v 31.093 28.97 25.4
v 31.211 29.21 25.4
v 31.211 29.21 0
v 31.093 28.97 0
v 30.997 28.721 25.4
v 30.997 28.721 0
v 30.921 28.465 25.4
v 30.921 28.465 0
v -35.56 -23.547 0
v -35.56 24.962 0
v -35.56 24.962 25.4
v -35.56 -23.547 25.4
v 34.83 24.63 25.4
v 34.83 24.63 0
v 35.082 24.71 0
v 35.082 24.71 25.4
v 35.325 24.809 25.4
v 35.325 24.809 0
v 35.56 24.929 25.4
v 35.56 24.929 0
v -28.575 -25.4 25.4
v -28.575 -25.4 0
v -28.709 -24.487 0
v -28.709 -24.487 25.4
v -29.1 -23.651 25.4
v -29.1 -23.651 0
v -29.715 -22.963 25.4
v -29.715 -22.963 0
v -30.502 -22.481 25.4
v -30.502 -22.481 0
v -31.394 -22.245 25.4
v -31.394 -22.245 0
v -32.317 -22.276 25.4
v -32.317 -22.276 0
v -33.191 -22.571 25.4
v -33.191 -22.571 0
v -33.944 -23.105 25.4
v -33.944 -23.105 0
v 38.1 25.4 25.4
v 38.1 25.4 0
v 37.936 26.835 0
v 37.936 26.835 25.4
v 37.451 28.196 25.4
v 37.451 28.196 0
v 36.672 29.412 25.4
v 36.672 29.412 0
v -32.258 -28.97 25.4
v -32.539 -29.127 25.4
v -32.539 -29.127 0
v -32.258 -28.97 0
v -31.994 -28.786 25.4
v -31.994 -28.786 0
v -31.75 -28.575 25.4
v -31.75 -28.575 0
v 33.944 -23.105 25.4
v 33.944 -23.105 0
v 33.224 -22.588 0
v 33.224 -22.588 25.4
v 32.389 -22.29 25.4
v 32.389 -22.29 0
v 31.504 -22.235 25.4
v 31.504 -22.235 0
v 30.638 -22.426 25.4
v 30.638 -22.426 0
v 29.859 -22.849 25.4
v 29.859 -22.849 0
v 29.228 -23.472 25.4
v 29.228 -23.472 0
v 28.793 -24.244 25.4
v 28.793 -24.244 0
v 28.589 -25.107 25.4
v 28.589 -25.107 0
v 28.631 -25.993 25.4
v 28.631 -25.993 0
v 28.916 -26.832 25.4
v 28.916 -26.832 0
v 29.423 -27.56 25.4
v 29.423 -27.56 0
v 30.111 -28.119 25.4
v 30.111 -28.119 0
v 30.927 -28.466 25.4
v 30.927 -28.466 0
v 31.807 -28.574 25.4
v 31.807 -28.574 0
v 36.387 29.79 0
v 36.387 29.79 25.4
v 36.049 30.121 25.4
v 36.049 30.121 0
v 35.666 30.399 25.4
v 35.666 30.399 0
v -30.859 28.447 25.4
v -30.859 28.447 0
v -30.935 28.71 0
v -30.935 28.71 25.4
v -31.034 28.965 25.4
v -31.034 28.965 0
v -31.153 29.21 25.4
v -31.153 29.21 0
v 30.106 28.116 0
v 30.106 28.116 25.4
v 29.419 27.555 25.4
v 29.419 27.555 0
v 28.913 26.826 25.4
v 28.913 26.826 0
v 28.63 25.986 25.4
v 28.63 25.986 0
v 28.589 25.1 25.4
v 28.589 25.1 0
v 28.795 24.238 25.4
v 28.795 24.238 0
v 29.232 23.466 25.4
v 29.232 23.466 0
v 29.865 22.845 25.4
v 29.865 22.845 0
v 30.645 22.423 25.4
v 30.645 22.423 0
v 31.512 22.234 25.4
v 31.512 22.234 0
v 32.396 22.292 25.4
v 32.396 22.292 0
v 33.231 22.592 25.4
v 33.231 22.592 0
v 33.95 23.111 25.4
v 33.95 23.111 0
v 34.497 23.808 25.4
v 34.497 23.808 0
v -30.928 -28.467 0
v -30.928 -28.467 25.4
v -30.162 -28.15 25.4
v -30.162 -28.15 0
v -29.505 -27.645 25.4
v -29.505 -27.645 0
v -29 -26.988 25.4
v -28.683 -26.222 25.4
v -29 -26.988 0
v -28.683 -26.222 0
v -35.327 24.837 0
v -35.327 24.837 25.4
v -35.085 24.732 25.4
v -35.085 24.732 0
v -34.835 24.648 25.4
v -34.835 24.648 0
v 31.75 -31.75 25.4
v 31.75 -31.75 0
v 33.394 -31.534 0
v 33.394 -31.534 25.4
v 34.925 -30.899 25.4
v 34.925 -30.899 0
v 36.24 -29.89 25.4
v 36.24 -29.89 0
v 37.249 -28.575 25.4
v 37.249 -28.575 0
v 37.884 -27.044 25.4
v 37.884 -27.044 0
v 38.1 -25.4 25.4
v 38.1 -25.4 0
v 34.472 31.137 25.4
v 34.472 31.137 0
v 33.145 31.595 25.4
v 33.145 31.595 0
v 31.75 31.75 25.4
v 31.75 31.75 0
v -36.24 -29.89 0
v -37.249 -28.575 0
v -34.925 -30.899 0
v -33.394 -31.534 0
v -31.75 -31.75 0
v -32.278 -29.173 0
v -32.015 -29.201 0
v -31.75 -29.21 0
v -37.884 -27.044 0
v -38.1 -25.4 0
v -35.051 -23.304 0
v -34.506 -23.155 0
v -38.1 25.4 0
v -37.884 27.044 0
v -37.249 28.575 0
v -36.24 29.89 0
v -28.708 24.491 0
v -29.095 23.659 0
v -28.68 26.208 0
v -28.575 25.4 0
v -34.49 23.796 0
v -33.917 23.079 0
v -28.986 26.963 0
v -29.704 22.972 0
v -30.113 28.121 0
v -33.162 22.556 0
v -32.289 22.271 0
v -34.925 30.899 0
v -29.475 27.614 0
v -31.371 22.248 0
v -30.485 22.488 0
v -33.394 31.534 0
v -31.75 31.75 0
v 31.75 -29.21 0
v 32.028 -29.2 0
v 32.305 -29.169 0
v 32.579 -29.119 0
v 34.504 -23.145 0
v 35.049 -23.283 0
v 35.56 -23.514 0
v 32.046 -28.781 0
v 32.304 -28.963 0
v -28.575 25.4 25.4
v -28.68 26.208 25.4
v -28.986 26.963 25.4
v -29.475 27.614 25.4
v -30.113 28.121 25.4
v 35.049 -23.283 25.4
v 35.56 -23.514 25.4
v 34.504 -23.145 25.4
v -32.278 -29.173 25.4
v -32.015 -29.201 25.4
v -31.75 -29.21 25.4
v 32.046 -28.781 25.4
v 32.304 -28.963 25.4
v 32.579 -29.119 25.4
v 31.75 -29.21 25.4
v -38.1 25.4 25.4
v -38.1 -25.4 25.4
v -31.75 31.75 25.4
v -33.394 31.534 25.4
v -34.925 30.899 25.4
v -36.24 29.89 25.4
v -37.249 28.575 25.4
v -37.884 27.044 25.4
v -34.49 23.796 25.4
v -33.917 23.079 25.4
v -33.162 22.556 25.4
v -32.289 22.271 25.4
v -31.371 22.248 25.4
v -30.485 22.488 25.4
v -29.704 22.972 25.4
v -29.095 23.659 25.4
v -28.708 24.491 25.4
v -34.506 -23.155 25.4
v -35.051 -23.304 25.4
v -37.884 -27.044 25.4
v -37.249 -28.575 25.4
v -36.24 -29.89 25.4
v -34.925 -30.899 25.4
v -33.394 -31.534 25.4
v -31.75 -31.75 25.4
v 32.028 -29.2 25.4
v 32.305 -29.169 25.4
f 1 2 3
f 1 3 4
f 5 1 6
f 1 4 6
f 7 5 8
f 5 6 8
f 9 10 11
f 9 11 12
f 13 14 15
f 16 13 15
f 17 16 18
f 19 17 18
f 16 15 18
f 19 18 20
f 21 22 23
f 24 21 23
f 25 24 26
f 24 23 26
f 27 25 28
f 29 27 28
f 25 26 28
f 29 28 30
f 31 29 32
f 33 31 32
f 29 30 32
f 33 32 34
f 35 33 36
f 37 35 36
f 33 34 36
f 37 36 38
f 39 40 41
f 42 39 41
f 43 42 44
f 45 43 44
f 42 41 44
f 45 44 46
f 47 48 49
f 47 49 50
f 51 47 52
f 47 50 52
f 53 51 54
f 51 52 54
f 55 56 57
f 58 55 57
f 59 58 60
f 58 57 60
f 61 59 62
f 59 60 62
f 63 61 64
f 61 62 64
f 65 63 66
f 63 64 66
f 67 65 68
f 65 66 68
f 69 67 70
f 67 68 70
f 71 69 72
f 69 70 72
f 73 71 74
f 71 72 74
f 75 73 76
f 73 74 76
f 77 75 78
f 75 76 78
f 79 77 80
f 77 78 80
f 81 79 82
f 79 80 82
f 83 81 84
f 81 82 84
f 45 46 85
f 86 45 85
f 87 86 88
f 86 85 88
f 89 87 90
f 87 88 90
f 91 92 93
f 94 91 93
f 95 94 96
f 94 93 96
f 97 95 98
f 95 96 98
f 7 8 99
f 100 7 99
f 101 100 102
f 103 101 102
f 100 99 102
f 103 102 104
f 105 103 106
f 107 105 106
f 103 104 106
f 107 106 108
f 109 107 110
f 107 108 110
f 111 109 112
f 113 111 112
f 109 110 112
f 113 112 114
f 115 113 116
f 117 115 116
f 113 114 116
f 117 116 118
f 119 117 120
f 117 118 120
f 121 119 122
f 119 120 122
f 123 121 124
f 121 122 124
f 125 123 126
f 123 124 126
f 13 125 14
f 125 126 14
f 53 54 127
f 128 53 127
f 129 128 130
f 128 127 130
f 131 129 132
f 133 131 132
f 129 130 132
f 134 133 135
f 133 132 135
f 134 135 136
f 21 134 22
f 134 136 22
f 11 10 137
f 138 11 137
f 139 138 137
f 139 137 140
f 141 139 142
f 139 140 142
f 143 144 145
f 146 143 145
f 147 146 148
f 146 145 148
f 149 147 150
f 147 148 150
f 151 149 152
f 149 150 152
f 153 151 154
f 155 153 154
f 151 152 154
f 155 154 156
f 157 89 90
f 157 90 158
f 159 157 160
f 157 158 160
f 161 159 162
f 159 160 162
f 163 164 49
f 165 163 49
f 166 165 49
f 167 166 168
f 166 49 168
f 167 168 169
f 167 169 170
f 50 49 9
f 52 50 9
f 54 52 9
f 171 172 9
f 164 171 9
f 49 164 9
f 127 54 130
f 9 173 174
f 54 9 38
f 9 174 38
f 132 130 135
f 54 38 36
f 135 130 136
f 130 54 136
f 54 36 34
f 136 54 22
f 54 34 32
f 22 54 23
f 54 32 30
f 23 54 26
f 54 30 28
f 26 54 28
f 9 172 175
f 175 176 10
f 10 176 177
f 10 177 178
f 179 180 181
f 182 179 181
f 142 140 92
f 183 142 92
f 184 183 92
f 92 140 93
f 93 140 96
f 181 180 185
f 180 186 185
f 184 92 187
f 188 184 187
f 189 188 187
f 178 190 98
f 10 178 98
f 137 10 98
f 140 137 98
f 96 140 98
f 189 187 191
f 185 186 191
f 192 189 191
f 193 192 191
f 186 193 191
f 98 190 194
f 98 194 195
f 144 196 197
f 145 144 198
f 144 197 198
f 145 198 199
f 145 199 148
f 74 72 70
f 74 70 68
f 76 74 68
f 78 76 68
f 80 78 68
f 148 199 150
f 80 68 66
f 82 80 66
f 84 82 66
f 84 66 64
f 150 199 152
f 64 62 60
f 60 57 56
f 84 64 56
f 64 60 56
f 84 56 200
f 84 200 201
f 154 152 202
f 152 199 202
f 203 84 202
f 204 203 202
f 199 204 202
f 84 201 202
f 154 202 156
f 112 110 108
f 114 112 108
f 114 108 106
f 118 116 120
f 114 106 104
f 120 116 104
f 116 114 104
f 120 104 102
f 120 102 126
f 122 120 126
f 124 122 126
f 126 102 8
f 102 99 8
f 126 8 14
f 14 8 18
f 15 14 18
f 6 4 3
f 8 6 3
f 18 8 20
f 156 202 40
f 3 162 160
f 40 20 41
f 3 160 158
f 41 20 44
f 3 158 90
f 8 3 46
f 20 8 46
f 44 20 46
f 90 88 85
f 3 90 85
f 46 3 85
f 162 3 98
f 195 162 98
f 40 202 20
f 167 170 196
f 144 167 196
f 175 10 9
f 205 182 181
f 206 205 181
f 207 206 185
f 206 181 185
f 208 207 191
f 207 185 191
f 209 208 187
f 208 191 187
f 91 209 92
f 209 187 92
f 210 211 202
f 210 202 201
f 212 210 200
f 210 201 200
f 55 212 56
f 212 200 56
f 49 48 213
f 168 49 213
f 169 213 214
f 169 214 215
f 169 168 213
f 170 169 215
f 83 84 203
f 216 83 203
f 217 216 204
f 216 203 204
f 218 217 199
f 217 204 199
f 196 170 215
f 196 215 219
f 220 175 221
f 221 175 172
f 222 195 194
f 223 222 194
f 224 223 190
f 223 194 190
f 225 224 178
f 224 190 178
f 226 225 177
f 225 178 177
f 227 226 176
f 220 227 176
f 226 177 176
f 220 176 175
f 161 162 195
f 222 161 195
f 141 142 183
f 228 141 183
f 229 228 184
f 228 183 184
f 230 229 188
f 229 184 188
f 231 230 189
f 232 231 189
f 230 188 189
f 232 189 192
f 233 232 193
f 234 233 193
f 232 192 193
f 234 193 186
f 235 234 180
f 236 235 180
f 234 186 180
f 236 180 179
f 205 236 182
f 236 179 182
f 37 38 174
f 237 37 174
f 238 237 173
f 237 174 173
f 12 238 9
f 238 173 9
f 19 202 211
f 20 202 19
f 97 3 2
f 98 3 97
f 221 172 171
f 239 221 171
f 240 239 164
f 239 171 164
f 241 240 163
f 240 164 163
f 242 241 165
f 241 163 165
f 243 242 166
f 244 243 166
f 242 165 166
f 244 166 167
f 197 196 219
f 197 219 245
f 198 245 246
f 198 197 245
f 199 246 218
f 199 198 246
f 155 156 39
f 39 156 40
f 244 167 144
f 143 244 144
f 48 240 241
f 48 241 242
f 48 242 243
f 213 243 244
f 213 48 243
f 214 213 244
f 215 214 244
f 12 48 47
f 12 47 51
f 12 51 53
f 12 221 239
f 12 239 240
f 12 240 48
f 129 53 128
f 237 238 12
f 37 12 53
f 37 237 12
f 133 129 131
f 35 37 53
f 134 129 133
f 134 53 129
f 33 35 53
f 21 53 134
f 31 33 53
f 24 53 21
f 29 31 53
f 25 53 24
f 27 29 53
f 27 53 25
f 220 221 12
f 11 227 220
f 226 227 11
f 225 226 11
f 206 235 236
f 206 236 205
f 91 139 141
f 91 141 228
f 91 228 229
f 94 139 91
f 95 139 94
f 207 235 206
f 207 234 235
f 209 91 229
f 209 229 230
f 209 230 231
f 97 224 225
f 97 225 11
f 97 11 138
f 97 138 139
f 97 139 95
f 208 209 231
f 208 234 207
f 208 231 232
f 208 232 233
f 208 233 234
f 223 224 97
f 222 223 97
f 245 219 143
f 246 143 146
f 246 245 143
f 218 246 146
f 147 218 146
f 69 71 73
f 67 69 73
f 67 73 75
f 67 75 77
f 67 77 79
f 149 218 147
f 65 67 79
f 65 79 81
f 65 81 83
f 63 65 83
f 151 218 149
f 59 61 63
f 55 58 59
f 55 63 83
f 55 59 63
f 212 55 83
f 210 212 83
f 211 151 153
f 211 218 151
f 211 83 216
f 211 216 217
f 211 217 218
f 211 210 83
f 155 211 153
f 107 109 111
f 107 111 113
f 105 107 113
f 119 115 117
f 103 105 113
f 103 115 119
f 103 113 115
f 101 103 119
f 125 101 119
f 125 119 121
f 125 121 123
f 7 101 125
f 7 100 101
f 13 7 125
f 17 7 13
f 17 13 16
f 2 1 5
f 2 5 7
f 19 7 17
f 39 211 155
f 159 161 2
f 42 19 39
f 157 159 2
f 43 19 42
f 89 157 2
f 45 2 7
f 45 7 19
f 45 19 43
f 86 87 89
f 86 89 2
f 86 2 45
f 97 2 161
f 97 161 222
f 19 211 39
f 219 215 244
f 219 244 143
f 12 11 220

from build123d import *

# Parameters (mm, degrees)
F1_DEPTH = 25.4
F2_T     = -2.54
F4_DEPTH = 25.4


with BuildPart() as f1:
    # F0 (on Top) → F1 (new body)
    with BuildSketch(Plane.XY):
        with BuildLine():
            Line((-31.75, -31.75), (31.75, -31.75))
            ThreePointArc((31.75, -31.75), (36.2401280605, -29.8901280605), (38.1, -25.4))
            Line((38.1, -25.4), (38.1, 25.4))
            ThreePointArc((38.1, 25.4), (36.2401280605, 29.8901280605), (31.75, 31.75))
            Line((31.75, 31.75), (-31.75, 31.75))
            ThreePointArc((-31.75, 31.75), (-36.2401280605, 29.8901280605), (-38.1, 25.4))
            Line((-38.1, 25.4), (-38.1, -25.4))
            ThreePointArc((-38.1, -25.4), (-36.2401280605, -29.8901280605), (-31.75, -31.75))
        make_face()
    extrude(amount=F1_DEPTH)

    # F2
    f2_openings = [f1.faces().sort_by_distance(p)[0] for p in [
        (0, 0, 0),
        (0, 0, 25.4),
    ]]
    offset(amount=F2_T, openings=f2_openings)

    # F3 (on Top) → F4 (join)
    with BuildSketch(Plane.XY):
        with BuildLine():
            ThreePointArc((-34.8345838171, 24.6476917684), (-31.3711389564, 22.2476850872), (-28.575, 25.4))
            ThreePointArc((-28.575, 25.4), (-29.2094457266, 27.3042607447), (-30.8592261315, 28.4474820615))
            ThreePointArc((-30.8592261315, 28.4474820615), (-30.7914950358, 28.0740348735), (-30.7688099486, 27.6951738299))
            ThreePointArc((-30.7688099486, 27.6951738299), (-32.0395492039, 25.1546195565), (-34.8345838171, 24.6476917684))
        make_face()
        with BuildLine():
            ThreePointArc((-30.7688099486, 27.6951738299), (-30.7914950358, 28.0740348735), (-30.8592261315, 28.4474820615))
            ThreePointArc((-30.8592261315, 28.4474820615), (-33.9438099486, 27.6951738299), (-34.8345838171, 24.6476917684))
            ThreePointArc((-34.8345838171, 24.6476917684), (-32.0395492039, 25.1546195565), (-30.7688099486, 27.6951738299))
        make_face()
        with BuildLine():
            ThreePointArc((-34.8345838171, 24.6476917684), (-33.9438099486, 27.6951738299), (-30.8592261315, 28.4474820615))
            ThreePointArc((-30.8592261315, 28.4474820615), (-36.1376198972, 29.9903476598), (-34.8345838171, 24.6476917684))
        make_face()
        with BuildLine():
            ThreePointArc((-31.75, -28.575), (-29.5049359697, -27.6450640303), (-28.575, -25.4))
            ThreePointArc((-28.575, -25.4), (-30.5019458319, -22.480584683), (-33.9438099486, -23.1048261701))
            ThreePointArc((-33.9438099486, -23.1048261701), (-31.6987459183, -24.0347621398), (-30.7688099486, -26.2798261701))
            ThreePointArc((-30.7688099486, -26.2798261701), (-31.0243946315, -27.5278803382), (-31.75, -28.575))
        make_face()
        with BuildLine():
            ThreePointArc((-30.7688099486, -26.2798261701), (-31.6987459183, -24.0347621398), (-33.9438099486, -23.1048261701))
            ThreePointArc((-33.9438099486, -23.1048261701), (-34.6968459334, -26.5818308022), (-31.75, -28.575))
            ThreePointArc((-31.75, -28.575), (-31.0243946315, -27.5278803382), (-30.7688099486, -26.2798261701))
        make_face()
        with BuildLine():
            ThreePointArc((-31.75, -28.575), (-34.6968459334, -26.5818308022), (-33.9438099486, -23.1048261701))
            ThreePointArc((-33.9438099486, -23.1048261701), (-36.890655882, -27.4616569723), (-31.75, -28.575))
        make_face()
        with BuildLine():
            ThreePointArc((34.8303002747, 24.630340843), (34.9012361362, 25.0122683738), (34.925, 25.4))
            ThreePointArc((34.925, 25.4), (33.6797927403, 27.9212149808), (30.9208897768, 28.4648329869))
            ThreePointArc((30.9208897768, 28.4648329869), (31.7779499244, 25.4284960104), (34.8303002747, 24.630340843))
        make_face()
        with BuildLine():
            ThreePointArc((30.9208897768, 28.4648329869), (33.6797927403, 27.9212149808), (34.925, 25.4))
            ThreePointArc((34.925, 25.4), (34.9012361362, 25.0122683738), (34.8303002747, 24.630340843))
            ThreePointArc((34.8303002747, 24.630340843), (36.5224050322, 25.7653810896), (37.1761900514, 27.6951738299))
            ThreePointArc((37.1761900514, 27.6951738299), (34.3889216777, 30.8464099661), (30.9208897768, 28.4648329869))
        make_face()
        with BuildLine():
            ThreePointArc((34.8303002747, 24.630340843), (31.7779499244, 25.4284960104), (30.9208897768, 28.4648329869))
            ThreePointArc((30.9208897768, 28.4648329869), (29.526759873, 23.1333221805), (34.8303002747, 24.630340843))
        make_face()
        with BuildLine():
            ThreePointArc((31.8068477454, -28.5744910354), (34.015073574, -27.6248745367), (34.925, -25.4))
            ThreePointArc((34.925, -25.4), (34.6695600543, -24.1522844518), (33.944342306, -23.1053351347))
            ThreePointArc((33.944342306, -23.1053351347), (31.0440156013, -25.1240821363), (31.8068477454, -28.5744910354))
        make_face()
        with BuildLine():
            ThreePointArc((33.944342306, -23.1053351347), (34.6695600543, -24.1522844518), (34.925, -25.4))
            ThreePointArc((34.925, -25.4), (34.015073574, -27.6248745367), (31.8068477454, -28.5744910354))
            ThreePointArc((31.8068477454, -28.5744910354), (35.2489055996, -29.1993862244), (37.1761900514, -26.2798261701))
            ThreePointArc((37.1761900514, -26.2798261701), (36.2260645881, -24.0147525961), (33.944342306, -23.1053351347))
        make_face()
        with BuildLine():
            ThreePointArc((31.8068477454, -28.5744910354), (31.0440156013, -25.1240821363), (33.944342306, -23.1053351347))
            ThreePointArc((33.944342306, -23.1053351347), (28.7928255499, -24.2442559662), (31.8068477454, -28.5744910354))
        make_face()
    extrude(amount=F4_DEPTH)


solid = f1.part
